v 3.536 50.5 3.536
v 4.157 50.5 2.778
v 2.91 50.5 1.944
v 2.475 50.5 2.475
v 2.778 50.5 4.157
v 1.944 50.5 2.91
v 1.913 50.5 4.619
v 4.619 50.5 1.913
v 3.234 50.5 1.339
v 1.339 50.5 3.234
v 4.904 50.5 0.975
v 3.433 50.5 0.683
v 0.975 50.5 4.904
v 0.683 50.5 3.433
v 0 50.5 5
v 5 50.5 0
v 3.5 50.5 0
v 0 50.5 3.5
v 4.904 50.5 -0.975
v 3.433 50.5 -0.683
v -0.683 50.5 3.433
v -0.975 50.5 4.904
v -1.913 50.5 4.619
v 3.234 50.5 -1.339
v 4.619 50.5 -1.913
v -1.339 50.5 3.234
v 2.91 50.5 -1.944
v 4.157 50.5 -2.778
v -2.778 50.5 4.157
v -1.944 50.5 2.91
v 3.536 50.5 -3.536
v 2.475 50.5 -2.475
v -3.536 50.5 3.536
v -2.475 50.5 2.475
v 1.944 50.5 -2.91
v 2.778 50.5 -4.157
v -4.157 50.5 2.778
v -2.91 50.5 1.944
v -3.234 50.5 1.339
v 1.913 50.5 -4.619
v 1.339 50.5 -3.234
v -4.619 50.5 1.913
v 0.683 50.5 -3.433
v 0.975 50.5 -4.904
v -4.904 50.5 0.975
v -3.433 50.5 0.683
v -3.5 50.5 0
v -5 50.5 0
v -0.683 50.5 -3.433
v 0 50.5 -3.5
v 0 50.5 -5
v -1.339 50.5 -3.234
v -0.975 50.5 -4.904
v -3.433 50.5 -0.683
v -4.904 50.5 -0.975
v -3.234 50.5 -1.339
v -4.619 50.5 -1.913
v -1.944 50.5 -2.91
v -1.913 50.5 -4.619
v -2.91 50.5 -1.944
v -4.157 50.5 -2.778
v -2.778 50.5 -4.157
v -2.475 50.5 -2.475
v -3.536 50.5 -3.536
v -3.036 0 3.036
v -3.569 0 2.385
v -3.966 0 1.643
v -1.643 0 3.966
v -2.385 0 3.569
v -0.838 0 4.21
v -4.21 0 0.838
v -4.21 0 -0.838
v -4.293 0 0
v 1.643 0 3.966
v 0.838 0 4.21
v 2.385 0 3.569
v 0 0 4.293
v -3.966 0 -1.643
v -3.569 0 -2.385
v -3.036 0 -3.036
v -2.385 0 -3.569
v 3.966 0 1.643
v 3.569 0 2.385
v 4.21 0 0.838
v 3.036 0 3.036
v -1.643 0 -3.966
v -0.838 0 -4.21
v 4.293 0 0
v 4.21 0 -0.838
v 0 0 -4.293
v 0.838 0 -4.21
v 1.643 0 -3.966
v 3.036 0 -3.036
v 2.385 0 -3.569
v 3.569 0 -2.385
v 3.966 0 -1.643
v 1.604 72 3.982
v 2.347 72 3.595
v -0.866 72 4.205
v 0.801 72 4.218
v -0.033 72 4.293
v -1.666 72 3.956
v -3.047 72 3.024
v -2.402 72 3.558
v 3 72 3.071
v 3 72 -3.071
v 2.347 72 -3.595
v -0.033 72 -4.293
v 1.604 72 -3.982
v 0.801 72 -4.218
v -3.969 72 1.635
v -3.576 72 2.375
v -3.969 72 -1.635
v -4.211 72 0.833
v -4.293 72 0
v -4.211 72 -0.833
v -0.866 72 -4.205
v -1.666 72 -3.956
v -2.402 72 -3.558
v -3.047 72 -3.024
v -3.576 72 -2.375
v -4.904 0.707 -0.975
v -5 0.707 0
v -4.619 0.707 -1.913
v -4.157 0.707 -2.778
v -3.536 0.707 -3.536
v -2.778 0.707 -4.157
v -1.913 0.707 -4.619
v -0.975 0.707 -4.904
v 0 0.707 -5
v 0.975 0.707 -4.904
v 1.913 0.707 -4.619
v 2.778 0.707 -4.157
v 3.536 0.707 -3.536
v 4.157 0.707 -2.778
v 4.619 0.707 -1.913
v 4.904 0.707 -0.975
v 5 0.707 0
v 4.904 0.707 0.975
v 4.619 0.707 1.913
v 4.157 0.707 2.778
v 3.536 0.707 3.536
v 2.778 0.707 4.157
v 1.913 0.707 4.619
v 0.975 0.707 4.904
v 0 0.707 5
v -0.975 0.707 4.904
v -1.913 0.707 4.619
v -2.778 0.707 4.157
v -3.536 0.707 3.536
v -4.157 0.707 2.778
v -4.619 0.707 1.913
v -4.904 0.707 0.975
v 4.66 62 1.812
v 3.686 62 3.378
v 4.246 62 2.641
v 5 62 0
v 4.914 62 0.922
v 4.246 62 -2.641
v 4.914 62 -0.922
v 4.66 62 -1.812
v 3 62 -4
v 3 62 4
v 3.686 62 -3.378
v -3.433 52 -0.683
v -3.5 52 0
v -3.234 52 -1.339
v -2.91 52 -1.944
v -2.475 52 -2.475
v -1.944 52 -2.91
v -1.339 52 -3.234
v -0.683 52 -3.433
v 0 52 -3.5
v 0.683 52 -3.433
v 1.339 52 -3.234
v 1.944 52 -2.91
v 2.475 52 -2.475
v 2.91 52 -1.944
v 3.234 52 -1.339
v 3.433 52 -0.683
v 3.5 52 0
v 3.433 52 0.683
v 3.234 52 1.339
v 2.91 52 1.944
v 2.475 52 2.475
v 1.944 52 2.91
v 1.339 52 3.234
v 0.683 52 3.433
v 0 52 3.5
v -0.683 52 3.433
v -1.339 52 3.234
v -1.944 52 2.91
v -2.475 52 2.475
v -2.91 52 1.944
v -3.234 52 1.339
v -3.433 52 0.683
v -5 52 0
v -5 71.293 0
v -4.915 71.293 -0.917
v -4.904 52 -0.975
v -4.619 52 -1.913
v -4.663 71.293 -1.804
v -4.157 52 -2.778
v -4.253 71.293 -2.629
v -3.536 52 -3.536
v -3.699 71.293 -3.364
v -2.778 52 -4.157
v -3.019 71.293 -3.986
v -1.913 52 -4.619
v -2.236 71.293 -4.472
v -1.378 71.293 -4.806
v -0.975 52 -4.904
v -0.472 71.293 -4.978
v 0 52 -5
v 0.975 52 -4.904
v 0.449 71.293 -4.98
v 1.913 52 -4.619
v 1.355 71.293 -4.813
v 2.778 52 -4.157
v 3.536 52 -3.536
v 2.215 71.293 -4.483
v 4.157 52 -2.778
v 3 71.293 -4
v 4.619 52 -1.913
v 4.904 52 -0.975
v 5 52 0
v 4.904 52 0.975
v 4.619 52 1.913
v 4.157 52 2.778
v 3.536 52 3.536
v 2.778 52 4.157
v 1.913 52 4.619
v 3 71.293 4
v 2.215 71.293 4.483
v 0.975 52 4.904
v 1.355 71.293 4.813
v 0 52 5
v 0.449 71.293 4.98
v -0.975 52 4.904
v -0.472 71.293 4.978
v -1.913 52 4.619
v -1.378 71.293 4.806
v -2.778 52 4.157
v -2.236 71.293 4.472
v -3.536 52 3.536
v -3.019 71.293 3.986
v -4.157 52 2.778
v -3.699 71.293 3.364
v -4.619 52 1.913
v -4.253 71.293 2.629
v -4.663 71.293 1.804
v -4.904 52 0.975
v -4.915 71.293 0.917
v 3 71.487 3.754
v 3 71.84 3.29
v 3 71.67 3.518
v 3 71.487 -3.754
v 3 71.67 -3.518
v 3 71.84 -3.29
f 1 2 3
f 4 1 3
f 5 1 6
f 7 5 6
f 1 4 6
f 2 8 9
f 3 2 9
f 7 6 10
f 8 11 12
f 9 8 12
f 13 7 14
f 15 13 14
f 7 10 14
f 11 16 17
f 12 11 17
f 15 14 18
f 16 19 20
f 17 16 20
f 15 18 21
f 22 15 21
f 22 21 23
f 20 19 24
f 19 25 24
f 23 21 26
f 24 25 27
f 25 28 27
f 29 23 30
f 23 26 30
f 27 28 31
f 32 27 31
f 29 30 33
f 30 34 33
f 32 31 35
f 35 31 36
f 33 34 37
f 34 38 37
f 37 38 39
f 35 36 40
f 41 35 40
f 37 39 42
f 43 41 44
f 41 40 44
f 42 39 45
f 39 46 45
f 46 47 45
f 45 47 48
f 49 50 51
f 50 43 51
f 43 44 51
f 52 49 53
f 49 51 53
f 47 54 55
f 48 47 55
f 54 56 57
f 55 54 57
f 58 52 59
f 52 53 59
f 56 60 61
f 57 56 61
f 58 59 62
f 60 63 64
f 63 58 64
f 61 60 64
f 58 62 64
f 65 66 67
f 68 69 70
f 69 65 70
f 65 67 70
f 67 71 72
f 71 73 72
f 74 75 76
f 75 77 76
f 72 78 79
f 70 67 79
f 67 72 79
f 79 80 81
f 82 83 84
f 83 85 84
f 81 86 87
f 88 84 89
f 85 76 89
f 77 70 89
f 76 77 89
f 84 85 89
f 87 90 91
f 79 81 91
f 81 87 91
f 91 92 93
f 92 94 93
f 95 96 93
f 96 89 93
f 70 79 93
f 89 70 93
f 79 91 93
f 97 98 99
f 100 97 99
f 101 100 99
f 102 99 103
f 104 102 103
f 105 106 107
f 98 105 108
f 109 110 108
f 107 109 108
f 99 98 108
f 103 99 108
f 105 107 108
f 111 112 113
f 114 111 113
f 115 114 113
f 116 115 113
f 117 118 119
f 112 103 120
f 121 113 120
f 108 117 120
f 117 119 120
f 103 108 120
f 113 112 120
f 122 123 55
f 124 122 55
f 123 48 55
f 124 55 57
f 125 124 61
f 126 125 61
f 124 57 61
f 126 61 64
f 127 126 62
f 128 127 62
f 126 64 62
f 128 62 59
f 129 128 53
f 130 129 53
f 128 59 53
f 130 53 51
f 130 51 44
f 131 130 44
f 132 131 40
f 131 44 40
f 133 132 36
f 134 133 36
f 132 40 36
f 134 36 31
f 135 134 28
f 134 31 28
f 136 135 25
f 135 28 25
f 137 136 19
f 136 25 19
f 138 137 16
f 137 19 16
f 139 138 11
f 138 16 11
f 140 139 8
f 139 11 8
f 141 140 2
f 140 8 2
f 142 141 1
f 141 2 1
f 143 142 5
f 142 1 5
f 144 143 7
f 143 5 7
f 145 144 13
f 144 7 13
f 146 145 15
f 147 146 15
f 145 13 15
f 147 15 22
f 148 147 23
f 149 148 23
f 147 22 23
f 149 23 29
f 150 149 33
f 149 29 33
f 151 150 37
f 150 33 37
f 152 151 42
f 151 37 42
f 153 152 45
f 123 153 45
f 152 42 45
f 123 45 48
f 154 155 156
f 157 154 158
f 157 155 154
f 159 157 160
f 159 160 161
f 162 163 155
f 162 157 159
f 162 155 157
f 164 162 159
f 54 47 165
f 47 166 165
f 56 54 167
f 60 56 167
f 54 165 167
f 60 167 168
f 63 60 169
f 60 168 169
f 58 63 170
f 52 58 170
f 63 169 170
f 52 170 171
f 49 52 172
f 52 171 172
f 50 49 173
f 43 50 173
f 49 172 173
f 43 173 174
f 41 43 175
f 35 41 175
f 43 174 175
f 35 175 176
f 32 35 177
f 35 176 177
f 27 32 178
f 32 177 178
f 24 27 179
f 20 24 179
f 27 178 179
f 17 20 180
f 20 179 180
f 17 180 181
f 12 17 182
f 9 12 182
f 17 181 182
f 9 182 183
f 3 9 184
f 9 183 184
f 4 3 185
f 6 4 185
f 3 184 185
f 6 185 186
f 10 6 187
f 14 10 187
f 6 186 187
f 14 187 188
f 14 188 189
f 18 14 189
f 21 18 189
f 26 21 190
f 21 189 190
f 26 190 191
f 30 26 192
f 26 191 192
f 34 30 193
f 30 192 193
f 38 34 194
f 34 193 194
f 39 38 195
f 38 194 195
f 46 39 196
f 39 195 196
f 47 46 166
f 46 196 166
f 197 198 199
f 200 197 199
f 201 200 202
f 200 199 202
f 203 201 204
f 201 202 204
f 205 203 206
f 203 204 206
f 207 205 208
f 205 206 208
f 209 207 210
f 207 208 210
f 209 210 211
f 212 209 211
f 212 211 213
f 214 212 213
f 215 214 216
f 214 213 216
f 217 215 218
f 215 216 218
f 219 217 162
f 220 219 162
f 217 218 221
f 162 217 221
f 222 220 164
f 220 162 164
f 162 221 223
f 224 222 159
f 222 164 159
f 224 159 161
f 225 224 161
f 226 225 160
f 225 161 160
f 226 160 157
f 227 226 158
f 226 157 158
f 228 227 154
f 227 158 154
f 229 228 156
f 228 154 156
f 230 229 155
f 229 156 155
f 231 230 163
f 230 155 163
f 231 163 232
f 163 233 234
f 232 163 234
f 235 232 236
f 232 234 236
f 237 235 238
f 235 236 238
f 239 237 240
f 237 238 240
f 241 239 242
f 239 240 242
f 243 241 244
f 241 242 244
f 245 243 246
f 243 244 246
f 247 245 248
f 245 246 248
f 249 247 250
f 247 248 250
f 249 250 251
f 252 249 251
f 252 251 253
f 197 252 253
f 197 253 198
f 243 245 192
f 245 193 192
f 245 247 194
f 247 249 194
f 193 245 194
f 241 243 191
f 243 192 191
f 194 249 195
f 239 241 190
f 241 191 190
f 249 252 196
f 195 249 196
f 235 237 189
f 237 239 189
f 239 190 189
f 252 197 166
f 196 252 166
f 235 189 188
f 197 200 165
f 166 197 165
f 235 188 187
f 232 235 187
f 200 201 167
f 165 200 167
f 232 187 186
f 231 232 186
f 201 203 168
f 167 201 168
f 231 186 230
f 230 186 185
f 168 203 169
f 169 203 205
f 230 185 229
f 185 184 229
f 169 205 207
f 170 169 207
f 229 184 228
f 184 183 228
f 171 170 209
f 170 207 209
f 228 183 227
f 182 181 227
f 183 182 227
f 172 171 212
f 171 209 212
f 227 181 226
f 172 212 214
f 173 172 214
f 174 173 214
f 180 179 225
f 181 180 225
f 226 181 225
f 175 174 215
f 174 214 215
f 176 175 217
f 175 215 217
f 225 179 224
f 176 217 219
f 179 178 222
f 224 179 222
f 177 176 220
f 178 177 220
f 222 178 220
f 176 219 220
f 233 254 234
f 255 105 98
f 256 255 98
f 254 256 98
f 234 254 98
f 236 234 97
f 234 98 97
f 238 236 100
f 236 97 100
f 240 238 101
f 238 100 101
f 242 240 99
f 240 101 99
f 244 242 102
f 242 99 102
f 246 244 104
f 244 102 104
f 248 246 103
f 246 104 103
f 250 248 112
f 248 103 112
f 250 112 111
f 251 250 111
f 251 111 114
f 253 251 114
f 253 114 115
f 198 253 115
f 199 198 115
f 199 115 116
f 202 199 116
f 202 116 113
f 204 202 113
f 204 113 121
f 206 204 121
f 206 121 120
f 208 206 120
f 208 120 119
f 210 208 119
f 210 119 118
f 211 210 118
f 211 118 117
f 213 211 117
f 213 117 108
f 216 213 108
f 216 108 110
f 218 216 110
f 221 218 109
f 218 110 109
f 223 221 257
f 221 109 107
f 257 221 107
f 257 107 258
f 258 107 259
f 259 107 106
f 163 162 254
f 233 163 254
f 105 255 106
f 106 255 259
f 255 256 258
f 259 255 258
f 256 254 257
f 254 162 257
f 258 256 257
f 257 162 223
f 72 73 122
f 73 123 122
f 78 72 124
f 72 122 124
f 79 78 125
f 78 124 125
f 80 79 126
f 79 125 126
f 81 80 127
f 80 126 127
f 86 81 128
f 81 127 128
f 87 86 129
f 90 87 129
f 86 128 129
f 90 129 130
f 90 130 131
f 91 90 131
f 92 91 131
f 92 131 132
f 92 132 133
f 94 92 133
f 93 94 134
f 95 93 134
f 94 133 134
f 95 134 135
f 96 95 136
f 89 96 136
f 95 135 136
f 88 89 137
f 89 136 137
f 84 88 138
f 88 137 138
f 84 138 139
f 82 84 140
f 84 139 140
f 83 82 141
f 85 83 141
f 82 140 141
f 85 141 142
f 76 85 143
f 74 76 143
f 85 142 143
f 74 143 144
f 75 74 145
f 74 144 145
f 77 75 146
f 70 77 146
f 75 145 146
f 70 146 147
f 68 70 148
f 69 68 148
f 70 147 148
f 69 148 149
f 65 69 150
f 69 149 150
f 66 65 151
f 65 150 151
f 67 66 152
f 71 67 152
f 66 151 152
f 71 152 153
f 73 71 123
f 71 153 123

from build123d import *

# Parameters (mm, degrees)
ENL_V_MAT_EXTRU_1_DEPTH      = 73.346388991
ENL_V_MAT_EXTRU_1_DEPTH_BACK = 73.346388991
ESQUISSE2_W                  = 6
ESQUISSE2_H                  = 14


with BuildPart() as part:
    # Esquisse1 → Révolution1 (revolve)
    with BuildSketch(Plane.XY):
        Polygon((0, 0), (-4.292893219, 0), (-5, 0.707106781), (-5, 50.5), (-3.5, 50.5), (-3.5, 52), (-5, 52), (-5, 71.292893219), (-4.292893219, 72), (0, 72), align=None)
    revolve(axis=Axis((0, 72, 0), (0, -1, 0)))

    # Esquisse2 → Enlèv. mat.-Extru.1 (cut, two sides: drawn at the far end of the back side and taken through both)
    with BuildSketch(Plane.XY.offset(-ENL_V_MAT_EXTRU_1_DEPTH_BACK)):
        with Locations((6, 69)):
            Rectangle(ESQUISSE2_W, ESQUISSE2_H)
    extrude(amount=ENL_V_MAT_EXTRU_1_DEPTH + ENL_V_MAT_EXTRU_1_DEPTH_BACK, mode=Mode.SUBTRACT)


solid = part.part
